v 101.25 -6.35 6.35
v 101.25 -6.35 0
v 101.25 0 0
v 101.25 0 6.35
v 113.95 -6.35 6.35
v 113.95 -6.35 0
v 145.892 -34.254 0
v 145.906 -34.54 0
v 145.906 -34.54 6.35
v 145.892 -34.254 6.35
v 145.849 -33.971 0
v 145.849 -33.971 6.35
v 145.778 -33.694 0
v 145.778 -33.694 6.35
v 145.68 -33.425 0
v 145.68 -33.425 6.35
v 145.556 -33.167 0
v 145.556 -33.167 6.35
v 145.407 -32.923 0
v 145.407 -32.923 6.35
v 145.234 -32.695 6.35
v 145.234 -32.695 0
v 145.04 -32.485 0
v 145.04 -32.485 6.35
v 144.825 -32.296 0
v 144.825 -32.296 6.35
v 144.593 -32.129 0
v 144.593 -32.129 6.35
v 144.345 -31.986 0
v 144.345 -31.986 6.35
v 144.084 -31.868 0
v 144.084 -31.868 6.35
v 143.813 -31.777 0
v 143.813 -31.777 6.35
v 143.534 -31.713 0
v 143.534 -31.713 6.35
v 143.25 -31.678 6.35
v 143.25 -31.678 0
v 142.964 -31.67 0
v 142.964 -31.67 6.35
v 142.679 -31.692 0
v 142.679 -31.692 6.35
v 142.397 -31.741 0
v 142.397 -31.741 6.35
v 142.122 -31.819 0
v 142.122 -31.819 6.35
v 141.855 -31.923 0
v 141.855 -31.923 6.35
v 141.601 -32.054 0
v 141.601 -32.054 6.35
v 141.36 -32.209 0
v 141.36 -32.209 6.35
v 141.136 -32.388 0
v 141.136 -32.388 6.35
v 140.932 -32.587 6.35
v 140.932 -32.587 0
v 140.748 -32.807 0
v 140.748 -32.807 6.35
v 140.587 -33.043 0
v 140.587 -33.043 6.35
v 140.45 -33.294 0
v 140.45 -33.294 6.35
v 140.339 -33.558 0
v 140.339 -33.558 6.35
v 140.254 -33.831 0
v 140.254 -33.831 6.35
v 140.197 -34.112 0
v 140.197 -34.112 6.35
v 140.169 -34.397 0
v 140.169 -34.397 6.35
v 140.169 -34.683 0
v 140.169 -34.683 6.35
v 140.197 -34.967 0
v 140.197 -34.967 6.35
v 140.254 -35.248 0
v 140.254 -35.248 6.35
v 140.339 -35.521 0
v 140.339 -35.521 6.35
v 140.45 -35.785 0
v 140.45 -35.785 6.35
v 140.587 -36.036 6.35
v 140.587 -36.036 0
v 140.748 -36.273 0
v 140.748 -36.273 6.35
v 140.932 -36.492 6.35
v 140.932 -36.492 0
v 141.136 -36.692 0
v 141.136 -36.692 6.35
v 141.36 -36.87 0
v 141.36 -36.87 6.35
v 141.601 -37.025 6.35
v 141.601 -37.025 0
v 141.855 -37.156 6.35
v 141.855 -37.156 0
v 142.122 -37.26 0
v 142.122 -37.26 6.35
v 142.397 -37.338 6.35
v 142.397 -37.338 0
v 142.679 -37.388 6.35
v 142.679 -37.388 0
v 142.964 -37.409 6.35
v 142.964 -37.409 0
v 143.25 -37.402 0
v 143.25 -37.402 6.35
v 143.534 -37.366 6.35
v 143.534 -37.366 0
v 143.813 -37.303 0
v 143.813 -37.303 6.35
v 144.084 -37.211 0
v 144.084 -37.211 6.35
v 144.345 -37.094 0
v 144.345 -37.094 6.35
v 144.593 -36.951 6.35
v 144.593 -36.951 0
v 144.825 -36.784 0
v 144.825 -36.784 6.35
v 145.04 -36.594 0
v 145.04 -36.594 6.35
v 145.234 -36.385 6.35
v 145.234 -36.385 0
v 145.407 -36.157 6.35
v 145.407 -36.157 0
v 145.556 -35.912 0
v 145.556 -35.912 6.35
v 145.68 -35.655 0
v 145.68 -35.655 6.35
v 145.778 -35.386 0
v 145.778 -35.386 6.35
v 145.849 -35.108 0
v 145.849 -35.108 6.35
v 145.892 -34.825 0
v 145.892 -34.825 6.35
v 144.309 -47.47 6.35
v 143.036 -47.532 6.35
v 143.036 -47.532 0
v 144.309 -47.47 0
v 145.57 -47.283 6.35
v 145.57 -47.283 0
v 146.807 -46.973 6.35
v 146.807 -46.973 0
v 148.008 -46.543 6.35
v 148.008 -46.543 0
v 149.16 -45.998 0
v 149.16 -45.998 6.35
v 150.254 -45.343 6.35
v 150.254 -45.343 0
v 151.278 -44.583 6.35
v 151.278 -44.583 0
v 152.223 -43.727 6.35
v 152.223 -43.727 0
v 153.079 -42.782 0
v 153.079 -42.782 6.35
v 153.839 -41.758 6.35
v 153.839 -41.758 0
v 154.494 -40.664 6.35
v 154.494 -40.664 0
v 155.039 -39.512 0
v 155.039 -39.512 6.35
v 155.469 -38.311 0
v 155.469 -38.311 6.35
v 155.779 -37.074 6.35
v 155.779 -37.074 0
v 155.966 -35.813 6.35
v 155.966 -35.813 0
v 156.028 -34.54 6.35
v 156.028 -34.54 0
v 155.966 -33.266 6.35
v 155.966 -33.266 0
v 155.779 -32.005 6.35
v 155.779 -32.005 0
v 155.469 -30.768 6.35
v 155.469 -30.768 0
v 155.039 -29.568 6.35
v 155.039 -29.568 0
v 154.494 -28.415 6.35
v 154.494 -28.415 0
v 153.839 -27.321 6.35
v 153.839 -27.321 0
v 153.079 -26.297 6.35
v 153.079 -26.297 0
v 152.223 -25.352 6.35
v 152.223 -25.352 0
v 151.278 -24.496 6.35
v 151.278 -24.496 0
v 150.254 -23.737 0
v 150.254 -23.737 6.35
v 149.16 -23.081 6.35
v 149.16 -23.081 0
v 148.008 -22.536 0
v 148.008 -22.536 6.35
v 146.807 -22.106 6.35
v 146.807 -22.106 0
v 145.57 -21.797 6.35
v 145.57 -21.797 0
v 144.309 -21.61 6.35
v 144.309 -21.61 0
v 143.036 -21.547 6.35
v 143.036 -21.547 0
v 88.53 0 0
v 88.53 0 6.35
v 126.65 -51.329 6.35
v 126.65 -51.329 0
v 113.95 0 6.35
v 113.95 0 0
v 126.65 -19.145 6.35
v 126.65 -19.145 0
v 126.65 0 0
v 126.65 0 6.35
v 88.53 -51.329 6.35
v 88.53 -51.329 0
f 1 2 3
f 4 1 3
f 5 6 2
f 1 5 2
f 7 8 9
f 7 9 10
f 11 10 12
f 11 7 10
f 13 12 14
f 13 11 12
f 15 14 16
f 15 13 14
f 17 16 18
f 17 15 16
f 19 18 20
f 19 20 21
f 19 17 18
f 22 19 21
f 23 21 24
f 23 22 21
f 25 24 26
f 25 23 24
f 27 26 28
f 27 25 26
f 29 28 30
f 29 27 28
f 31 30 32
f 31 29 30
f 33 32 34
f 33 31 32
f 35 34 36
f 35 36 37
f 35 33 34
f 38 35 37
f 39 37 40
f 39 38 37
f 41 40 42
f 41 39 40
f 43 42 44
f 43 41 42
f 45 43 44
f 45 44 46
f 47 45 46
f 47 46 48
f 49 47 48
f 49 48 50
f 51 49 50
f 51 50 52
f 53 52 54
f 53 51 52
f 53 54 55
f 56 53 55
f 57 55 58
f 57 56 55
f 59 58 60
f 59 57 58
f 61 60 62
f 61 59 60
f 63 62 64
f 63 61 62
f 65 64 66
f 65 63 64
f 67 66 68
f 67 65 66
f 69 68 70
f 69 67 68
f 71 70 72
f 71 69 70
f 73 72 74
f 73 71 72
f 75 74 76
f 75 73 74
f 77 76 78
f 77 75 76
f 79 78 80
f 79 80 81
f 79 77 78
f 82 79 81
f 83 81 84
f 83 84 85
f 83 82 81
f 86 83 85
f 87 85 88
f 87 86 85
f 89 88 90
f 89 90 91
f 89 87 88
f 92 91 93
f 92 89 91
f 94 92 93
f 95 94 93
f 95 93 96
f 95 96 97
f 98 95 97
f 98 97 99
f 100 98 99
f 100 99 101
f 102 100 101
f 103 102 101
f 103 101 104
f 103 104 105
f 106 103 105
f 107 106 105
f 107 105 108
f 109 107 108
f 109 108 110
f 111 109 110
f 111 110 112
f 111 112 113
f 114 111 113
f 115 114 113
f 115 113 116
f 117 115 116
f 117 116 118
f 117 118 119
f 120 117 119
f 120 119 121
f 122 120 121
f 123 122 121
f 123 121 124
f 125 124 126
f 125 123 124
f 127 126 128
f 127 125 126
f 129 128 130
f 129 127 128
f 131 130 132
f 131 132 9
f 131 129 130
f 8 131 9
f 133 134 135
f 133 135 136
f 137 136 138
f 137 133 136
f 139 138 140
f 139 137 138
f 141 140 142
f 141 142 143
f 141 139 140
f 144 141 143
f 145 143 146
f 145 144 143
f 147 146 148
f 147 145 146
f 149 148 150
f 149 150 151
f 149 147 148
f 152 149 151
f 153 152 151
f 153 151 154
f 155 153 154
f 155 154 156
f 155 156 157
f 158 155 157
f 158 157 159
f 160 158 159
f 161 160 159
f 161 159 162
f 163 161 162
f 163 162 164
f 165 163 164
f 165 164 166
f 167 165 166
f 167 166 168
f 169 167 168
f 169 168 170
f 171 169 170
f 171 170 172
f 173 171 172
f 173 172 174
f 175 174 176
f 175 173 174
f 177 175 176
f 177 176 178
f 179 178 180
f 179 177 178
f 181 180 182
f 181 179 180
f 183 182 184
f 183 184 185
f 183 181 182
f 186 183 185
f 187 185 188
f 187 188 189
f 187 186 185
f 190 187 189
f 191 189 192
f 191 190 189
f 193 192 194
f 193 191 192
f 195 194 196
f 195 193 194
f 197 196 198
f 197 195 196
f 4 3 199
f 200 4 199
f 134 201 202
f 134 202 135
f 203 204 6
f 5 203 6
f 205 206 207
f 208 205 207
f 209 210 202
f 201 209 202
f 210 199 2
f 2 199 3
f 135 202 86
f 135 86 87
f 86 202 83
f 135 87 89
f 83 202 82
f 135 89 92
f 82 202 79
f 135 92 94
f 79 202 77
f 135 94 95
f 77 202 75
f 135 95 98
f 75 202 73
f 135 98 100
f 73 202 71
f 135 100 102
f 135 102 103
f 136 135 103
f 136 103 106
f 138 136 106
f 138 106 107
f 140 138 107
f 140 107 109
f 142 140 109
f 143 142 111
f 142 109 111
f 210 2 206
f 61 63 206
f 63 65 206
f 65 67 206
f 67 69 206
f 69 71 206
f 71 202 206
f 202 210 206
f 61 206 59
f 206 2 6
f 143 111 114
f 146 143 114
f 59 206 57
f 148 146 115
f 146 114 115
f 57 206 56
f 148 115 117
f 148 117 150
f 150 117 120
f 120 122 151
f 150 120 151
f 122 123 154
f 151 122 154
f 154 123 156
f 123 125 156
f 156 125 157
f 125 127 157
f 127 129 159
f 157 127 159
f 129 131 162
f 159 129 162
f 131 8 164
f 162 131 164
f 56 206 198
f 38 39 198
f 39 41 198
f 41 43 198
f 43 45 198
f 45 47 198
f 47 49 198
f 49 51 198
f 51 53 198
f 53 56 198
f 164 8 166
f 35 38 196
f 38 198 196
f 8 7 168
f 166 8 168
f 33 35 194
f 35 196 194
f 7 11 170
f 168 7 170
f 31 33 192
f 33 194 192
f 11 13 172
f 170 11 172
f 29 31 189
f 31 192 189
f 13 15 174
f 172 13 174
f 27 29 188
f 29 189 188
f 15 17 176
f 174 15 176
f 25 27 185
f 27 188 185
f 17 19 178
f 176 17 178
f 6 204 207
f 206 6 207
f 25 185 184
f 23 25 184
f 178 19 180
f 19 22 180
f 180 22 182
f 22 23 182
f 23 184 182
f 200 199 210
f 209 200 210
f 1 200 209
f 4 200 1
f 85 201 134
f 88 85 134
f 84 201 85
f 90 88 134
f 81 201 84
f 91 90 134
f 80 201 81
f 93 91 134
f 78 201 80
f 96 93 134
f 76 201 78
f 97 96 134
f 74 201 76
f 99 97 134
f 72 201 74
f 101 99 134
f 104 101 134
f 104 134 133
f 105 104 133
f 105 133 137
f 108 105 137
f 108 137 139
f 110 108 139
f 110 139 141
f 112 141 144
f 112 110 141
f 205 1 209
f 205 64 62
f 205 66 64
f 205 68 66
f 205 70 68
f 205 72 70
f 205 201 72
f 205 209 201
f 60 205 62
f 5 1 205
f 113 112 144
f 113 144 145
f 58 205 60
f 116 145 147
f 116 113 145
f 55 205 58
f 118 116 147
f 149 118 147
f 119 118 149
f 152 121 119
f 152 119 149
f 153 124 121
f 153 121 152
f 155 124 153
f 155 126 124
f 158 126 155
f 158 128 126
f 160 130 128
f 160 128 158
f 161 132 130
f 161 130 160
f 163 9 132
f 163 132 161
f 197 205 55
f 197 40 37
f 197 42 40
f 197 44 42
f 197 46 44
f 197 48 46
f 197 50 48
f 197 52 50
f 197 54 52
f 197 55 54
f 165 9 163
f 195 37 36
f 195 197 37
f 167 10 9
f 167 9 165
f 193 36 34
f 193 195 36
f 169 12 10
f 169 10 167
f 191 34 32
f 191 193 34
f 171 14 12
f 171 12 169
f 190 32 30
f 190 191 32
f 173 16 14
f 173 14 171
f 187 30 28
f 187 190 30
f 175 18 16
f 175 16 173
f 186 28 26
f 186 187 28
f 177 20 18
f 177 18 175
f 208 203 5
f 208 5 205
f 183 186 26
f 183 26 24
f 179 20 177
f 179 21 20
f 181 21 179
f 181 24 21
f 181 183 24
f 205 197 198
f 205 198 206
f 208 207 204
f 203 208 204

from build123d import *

# Parameters (mm, degrees)
SKETCH1_R           = 2.8702
BOSS_EXTRUDE1_DEPTH = 6.35
CUT_EXTRUDE1_DEPTH  = 166.459251888


with BuildPart() as part:
    # Sketch1 → Boss-Extrude1 (new body)
    with BuildSketch(Plane.XY):
        Polygon((126.649884677, 0), (113.949884677, 0), (113.949884677, -6.35), (101.249884677, -6.35), (101.249884677, 0), (88.530166142, 0), (88.530166142, -6.35), (88.530166142, -19.145228109), (88.530166142, -51.329150083), (157.167935302, -51.329150083), (157.167935302, -19.145228109), (126.649884677, -19.145228109), (126.649884677, -6.35), align=None)
        with Locations((143.035641266, -34.539684717)):
            Circle(SKETCH1_R, mode=Mode.SUBTRACT)
    extrude(amount=BOSS_EXTRUDE1_DEPTH)

    # Sketch2 → Cut-Extrude1 (cut, through all)
    with BuildSketch(Plane.XY.offset(6.35)):
        with BuildLine():
            Line((143.035641266, -21.547019343), (126.649884677, -19.145228109))
            Line((126.649884677, -19.145228109), (157.167935302, -19.145228109))
            Line((157.167935302, -19.145228109), (157.167935302, -51.329150083))
            Line((157.167935302, -51.329150083), (126.649884677, -51.329150083))
            Line((126.649884677, -51.329150083), (143.035641266, -47.532350091))
            ThreePointArc((143.035641266, -47.532350091), (156.028306641, -34.539684717), (143.035641266, -21.547019343))
        make_face()
    extrude(amount=-CUT_EXTRUDE1_DEPTH, mode=Mode.SUBTRACT)


solid = part.part
